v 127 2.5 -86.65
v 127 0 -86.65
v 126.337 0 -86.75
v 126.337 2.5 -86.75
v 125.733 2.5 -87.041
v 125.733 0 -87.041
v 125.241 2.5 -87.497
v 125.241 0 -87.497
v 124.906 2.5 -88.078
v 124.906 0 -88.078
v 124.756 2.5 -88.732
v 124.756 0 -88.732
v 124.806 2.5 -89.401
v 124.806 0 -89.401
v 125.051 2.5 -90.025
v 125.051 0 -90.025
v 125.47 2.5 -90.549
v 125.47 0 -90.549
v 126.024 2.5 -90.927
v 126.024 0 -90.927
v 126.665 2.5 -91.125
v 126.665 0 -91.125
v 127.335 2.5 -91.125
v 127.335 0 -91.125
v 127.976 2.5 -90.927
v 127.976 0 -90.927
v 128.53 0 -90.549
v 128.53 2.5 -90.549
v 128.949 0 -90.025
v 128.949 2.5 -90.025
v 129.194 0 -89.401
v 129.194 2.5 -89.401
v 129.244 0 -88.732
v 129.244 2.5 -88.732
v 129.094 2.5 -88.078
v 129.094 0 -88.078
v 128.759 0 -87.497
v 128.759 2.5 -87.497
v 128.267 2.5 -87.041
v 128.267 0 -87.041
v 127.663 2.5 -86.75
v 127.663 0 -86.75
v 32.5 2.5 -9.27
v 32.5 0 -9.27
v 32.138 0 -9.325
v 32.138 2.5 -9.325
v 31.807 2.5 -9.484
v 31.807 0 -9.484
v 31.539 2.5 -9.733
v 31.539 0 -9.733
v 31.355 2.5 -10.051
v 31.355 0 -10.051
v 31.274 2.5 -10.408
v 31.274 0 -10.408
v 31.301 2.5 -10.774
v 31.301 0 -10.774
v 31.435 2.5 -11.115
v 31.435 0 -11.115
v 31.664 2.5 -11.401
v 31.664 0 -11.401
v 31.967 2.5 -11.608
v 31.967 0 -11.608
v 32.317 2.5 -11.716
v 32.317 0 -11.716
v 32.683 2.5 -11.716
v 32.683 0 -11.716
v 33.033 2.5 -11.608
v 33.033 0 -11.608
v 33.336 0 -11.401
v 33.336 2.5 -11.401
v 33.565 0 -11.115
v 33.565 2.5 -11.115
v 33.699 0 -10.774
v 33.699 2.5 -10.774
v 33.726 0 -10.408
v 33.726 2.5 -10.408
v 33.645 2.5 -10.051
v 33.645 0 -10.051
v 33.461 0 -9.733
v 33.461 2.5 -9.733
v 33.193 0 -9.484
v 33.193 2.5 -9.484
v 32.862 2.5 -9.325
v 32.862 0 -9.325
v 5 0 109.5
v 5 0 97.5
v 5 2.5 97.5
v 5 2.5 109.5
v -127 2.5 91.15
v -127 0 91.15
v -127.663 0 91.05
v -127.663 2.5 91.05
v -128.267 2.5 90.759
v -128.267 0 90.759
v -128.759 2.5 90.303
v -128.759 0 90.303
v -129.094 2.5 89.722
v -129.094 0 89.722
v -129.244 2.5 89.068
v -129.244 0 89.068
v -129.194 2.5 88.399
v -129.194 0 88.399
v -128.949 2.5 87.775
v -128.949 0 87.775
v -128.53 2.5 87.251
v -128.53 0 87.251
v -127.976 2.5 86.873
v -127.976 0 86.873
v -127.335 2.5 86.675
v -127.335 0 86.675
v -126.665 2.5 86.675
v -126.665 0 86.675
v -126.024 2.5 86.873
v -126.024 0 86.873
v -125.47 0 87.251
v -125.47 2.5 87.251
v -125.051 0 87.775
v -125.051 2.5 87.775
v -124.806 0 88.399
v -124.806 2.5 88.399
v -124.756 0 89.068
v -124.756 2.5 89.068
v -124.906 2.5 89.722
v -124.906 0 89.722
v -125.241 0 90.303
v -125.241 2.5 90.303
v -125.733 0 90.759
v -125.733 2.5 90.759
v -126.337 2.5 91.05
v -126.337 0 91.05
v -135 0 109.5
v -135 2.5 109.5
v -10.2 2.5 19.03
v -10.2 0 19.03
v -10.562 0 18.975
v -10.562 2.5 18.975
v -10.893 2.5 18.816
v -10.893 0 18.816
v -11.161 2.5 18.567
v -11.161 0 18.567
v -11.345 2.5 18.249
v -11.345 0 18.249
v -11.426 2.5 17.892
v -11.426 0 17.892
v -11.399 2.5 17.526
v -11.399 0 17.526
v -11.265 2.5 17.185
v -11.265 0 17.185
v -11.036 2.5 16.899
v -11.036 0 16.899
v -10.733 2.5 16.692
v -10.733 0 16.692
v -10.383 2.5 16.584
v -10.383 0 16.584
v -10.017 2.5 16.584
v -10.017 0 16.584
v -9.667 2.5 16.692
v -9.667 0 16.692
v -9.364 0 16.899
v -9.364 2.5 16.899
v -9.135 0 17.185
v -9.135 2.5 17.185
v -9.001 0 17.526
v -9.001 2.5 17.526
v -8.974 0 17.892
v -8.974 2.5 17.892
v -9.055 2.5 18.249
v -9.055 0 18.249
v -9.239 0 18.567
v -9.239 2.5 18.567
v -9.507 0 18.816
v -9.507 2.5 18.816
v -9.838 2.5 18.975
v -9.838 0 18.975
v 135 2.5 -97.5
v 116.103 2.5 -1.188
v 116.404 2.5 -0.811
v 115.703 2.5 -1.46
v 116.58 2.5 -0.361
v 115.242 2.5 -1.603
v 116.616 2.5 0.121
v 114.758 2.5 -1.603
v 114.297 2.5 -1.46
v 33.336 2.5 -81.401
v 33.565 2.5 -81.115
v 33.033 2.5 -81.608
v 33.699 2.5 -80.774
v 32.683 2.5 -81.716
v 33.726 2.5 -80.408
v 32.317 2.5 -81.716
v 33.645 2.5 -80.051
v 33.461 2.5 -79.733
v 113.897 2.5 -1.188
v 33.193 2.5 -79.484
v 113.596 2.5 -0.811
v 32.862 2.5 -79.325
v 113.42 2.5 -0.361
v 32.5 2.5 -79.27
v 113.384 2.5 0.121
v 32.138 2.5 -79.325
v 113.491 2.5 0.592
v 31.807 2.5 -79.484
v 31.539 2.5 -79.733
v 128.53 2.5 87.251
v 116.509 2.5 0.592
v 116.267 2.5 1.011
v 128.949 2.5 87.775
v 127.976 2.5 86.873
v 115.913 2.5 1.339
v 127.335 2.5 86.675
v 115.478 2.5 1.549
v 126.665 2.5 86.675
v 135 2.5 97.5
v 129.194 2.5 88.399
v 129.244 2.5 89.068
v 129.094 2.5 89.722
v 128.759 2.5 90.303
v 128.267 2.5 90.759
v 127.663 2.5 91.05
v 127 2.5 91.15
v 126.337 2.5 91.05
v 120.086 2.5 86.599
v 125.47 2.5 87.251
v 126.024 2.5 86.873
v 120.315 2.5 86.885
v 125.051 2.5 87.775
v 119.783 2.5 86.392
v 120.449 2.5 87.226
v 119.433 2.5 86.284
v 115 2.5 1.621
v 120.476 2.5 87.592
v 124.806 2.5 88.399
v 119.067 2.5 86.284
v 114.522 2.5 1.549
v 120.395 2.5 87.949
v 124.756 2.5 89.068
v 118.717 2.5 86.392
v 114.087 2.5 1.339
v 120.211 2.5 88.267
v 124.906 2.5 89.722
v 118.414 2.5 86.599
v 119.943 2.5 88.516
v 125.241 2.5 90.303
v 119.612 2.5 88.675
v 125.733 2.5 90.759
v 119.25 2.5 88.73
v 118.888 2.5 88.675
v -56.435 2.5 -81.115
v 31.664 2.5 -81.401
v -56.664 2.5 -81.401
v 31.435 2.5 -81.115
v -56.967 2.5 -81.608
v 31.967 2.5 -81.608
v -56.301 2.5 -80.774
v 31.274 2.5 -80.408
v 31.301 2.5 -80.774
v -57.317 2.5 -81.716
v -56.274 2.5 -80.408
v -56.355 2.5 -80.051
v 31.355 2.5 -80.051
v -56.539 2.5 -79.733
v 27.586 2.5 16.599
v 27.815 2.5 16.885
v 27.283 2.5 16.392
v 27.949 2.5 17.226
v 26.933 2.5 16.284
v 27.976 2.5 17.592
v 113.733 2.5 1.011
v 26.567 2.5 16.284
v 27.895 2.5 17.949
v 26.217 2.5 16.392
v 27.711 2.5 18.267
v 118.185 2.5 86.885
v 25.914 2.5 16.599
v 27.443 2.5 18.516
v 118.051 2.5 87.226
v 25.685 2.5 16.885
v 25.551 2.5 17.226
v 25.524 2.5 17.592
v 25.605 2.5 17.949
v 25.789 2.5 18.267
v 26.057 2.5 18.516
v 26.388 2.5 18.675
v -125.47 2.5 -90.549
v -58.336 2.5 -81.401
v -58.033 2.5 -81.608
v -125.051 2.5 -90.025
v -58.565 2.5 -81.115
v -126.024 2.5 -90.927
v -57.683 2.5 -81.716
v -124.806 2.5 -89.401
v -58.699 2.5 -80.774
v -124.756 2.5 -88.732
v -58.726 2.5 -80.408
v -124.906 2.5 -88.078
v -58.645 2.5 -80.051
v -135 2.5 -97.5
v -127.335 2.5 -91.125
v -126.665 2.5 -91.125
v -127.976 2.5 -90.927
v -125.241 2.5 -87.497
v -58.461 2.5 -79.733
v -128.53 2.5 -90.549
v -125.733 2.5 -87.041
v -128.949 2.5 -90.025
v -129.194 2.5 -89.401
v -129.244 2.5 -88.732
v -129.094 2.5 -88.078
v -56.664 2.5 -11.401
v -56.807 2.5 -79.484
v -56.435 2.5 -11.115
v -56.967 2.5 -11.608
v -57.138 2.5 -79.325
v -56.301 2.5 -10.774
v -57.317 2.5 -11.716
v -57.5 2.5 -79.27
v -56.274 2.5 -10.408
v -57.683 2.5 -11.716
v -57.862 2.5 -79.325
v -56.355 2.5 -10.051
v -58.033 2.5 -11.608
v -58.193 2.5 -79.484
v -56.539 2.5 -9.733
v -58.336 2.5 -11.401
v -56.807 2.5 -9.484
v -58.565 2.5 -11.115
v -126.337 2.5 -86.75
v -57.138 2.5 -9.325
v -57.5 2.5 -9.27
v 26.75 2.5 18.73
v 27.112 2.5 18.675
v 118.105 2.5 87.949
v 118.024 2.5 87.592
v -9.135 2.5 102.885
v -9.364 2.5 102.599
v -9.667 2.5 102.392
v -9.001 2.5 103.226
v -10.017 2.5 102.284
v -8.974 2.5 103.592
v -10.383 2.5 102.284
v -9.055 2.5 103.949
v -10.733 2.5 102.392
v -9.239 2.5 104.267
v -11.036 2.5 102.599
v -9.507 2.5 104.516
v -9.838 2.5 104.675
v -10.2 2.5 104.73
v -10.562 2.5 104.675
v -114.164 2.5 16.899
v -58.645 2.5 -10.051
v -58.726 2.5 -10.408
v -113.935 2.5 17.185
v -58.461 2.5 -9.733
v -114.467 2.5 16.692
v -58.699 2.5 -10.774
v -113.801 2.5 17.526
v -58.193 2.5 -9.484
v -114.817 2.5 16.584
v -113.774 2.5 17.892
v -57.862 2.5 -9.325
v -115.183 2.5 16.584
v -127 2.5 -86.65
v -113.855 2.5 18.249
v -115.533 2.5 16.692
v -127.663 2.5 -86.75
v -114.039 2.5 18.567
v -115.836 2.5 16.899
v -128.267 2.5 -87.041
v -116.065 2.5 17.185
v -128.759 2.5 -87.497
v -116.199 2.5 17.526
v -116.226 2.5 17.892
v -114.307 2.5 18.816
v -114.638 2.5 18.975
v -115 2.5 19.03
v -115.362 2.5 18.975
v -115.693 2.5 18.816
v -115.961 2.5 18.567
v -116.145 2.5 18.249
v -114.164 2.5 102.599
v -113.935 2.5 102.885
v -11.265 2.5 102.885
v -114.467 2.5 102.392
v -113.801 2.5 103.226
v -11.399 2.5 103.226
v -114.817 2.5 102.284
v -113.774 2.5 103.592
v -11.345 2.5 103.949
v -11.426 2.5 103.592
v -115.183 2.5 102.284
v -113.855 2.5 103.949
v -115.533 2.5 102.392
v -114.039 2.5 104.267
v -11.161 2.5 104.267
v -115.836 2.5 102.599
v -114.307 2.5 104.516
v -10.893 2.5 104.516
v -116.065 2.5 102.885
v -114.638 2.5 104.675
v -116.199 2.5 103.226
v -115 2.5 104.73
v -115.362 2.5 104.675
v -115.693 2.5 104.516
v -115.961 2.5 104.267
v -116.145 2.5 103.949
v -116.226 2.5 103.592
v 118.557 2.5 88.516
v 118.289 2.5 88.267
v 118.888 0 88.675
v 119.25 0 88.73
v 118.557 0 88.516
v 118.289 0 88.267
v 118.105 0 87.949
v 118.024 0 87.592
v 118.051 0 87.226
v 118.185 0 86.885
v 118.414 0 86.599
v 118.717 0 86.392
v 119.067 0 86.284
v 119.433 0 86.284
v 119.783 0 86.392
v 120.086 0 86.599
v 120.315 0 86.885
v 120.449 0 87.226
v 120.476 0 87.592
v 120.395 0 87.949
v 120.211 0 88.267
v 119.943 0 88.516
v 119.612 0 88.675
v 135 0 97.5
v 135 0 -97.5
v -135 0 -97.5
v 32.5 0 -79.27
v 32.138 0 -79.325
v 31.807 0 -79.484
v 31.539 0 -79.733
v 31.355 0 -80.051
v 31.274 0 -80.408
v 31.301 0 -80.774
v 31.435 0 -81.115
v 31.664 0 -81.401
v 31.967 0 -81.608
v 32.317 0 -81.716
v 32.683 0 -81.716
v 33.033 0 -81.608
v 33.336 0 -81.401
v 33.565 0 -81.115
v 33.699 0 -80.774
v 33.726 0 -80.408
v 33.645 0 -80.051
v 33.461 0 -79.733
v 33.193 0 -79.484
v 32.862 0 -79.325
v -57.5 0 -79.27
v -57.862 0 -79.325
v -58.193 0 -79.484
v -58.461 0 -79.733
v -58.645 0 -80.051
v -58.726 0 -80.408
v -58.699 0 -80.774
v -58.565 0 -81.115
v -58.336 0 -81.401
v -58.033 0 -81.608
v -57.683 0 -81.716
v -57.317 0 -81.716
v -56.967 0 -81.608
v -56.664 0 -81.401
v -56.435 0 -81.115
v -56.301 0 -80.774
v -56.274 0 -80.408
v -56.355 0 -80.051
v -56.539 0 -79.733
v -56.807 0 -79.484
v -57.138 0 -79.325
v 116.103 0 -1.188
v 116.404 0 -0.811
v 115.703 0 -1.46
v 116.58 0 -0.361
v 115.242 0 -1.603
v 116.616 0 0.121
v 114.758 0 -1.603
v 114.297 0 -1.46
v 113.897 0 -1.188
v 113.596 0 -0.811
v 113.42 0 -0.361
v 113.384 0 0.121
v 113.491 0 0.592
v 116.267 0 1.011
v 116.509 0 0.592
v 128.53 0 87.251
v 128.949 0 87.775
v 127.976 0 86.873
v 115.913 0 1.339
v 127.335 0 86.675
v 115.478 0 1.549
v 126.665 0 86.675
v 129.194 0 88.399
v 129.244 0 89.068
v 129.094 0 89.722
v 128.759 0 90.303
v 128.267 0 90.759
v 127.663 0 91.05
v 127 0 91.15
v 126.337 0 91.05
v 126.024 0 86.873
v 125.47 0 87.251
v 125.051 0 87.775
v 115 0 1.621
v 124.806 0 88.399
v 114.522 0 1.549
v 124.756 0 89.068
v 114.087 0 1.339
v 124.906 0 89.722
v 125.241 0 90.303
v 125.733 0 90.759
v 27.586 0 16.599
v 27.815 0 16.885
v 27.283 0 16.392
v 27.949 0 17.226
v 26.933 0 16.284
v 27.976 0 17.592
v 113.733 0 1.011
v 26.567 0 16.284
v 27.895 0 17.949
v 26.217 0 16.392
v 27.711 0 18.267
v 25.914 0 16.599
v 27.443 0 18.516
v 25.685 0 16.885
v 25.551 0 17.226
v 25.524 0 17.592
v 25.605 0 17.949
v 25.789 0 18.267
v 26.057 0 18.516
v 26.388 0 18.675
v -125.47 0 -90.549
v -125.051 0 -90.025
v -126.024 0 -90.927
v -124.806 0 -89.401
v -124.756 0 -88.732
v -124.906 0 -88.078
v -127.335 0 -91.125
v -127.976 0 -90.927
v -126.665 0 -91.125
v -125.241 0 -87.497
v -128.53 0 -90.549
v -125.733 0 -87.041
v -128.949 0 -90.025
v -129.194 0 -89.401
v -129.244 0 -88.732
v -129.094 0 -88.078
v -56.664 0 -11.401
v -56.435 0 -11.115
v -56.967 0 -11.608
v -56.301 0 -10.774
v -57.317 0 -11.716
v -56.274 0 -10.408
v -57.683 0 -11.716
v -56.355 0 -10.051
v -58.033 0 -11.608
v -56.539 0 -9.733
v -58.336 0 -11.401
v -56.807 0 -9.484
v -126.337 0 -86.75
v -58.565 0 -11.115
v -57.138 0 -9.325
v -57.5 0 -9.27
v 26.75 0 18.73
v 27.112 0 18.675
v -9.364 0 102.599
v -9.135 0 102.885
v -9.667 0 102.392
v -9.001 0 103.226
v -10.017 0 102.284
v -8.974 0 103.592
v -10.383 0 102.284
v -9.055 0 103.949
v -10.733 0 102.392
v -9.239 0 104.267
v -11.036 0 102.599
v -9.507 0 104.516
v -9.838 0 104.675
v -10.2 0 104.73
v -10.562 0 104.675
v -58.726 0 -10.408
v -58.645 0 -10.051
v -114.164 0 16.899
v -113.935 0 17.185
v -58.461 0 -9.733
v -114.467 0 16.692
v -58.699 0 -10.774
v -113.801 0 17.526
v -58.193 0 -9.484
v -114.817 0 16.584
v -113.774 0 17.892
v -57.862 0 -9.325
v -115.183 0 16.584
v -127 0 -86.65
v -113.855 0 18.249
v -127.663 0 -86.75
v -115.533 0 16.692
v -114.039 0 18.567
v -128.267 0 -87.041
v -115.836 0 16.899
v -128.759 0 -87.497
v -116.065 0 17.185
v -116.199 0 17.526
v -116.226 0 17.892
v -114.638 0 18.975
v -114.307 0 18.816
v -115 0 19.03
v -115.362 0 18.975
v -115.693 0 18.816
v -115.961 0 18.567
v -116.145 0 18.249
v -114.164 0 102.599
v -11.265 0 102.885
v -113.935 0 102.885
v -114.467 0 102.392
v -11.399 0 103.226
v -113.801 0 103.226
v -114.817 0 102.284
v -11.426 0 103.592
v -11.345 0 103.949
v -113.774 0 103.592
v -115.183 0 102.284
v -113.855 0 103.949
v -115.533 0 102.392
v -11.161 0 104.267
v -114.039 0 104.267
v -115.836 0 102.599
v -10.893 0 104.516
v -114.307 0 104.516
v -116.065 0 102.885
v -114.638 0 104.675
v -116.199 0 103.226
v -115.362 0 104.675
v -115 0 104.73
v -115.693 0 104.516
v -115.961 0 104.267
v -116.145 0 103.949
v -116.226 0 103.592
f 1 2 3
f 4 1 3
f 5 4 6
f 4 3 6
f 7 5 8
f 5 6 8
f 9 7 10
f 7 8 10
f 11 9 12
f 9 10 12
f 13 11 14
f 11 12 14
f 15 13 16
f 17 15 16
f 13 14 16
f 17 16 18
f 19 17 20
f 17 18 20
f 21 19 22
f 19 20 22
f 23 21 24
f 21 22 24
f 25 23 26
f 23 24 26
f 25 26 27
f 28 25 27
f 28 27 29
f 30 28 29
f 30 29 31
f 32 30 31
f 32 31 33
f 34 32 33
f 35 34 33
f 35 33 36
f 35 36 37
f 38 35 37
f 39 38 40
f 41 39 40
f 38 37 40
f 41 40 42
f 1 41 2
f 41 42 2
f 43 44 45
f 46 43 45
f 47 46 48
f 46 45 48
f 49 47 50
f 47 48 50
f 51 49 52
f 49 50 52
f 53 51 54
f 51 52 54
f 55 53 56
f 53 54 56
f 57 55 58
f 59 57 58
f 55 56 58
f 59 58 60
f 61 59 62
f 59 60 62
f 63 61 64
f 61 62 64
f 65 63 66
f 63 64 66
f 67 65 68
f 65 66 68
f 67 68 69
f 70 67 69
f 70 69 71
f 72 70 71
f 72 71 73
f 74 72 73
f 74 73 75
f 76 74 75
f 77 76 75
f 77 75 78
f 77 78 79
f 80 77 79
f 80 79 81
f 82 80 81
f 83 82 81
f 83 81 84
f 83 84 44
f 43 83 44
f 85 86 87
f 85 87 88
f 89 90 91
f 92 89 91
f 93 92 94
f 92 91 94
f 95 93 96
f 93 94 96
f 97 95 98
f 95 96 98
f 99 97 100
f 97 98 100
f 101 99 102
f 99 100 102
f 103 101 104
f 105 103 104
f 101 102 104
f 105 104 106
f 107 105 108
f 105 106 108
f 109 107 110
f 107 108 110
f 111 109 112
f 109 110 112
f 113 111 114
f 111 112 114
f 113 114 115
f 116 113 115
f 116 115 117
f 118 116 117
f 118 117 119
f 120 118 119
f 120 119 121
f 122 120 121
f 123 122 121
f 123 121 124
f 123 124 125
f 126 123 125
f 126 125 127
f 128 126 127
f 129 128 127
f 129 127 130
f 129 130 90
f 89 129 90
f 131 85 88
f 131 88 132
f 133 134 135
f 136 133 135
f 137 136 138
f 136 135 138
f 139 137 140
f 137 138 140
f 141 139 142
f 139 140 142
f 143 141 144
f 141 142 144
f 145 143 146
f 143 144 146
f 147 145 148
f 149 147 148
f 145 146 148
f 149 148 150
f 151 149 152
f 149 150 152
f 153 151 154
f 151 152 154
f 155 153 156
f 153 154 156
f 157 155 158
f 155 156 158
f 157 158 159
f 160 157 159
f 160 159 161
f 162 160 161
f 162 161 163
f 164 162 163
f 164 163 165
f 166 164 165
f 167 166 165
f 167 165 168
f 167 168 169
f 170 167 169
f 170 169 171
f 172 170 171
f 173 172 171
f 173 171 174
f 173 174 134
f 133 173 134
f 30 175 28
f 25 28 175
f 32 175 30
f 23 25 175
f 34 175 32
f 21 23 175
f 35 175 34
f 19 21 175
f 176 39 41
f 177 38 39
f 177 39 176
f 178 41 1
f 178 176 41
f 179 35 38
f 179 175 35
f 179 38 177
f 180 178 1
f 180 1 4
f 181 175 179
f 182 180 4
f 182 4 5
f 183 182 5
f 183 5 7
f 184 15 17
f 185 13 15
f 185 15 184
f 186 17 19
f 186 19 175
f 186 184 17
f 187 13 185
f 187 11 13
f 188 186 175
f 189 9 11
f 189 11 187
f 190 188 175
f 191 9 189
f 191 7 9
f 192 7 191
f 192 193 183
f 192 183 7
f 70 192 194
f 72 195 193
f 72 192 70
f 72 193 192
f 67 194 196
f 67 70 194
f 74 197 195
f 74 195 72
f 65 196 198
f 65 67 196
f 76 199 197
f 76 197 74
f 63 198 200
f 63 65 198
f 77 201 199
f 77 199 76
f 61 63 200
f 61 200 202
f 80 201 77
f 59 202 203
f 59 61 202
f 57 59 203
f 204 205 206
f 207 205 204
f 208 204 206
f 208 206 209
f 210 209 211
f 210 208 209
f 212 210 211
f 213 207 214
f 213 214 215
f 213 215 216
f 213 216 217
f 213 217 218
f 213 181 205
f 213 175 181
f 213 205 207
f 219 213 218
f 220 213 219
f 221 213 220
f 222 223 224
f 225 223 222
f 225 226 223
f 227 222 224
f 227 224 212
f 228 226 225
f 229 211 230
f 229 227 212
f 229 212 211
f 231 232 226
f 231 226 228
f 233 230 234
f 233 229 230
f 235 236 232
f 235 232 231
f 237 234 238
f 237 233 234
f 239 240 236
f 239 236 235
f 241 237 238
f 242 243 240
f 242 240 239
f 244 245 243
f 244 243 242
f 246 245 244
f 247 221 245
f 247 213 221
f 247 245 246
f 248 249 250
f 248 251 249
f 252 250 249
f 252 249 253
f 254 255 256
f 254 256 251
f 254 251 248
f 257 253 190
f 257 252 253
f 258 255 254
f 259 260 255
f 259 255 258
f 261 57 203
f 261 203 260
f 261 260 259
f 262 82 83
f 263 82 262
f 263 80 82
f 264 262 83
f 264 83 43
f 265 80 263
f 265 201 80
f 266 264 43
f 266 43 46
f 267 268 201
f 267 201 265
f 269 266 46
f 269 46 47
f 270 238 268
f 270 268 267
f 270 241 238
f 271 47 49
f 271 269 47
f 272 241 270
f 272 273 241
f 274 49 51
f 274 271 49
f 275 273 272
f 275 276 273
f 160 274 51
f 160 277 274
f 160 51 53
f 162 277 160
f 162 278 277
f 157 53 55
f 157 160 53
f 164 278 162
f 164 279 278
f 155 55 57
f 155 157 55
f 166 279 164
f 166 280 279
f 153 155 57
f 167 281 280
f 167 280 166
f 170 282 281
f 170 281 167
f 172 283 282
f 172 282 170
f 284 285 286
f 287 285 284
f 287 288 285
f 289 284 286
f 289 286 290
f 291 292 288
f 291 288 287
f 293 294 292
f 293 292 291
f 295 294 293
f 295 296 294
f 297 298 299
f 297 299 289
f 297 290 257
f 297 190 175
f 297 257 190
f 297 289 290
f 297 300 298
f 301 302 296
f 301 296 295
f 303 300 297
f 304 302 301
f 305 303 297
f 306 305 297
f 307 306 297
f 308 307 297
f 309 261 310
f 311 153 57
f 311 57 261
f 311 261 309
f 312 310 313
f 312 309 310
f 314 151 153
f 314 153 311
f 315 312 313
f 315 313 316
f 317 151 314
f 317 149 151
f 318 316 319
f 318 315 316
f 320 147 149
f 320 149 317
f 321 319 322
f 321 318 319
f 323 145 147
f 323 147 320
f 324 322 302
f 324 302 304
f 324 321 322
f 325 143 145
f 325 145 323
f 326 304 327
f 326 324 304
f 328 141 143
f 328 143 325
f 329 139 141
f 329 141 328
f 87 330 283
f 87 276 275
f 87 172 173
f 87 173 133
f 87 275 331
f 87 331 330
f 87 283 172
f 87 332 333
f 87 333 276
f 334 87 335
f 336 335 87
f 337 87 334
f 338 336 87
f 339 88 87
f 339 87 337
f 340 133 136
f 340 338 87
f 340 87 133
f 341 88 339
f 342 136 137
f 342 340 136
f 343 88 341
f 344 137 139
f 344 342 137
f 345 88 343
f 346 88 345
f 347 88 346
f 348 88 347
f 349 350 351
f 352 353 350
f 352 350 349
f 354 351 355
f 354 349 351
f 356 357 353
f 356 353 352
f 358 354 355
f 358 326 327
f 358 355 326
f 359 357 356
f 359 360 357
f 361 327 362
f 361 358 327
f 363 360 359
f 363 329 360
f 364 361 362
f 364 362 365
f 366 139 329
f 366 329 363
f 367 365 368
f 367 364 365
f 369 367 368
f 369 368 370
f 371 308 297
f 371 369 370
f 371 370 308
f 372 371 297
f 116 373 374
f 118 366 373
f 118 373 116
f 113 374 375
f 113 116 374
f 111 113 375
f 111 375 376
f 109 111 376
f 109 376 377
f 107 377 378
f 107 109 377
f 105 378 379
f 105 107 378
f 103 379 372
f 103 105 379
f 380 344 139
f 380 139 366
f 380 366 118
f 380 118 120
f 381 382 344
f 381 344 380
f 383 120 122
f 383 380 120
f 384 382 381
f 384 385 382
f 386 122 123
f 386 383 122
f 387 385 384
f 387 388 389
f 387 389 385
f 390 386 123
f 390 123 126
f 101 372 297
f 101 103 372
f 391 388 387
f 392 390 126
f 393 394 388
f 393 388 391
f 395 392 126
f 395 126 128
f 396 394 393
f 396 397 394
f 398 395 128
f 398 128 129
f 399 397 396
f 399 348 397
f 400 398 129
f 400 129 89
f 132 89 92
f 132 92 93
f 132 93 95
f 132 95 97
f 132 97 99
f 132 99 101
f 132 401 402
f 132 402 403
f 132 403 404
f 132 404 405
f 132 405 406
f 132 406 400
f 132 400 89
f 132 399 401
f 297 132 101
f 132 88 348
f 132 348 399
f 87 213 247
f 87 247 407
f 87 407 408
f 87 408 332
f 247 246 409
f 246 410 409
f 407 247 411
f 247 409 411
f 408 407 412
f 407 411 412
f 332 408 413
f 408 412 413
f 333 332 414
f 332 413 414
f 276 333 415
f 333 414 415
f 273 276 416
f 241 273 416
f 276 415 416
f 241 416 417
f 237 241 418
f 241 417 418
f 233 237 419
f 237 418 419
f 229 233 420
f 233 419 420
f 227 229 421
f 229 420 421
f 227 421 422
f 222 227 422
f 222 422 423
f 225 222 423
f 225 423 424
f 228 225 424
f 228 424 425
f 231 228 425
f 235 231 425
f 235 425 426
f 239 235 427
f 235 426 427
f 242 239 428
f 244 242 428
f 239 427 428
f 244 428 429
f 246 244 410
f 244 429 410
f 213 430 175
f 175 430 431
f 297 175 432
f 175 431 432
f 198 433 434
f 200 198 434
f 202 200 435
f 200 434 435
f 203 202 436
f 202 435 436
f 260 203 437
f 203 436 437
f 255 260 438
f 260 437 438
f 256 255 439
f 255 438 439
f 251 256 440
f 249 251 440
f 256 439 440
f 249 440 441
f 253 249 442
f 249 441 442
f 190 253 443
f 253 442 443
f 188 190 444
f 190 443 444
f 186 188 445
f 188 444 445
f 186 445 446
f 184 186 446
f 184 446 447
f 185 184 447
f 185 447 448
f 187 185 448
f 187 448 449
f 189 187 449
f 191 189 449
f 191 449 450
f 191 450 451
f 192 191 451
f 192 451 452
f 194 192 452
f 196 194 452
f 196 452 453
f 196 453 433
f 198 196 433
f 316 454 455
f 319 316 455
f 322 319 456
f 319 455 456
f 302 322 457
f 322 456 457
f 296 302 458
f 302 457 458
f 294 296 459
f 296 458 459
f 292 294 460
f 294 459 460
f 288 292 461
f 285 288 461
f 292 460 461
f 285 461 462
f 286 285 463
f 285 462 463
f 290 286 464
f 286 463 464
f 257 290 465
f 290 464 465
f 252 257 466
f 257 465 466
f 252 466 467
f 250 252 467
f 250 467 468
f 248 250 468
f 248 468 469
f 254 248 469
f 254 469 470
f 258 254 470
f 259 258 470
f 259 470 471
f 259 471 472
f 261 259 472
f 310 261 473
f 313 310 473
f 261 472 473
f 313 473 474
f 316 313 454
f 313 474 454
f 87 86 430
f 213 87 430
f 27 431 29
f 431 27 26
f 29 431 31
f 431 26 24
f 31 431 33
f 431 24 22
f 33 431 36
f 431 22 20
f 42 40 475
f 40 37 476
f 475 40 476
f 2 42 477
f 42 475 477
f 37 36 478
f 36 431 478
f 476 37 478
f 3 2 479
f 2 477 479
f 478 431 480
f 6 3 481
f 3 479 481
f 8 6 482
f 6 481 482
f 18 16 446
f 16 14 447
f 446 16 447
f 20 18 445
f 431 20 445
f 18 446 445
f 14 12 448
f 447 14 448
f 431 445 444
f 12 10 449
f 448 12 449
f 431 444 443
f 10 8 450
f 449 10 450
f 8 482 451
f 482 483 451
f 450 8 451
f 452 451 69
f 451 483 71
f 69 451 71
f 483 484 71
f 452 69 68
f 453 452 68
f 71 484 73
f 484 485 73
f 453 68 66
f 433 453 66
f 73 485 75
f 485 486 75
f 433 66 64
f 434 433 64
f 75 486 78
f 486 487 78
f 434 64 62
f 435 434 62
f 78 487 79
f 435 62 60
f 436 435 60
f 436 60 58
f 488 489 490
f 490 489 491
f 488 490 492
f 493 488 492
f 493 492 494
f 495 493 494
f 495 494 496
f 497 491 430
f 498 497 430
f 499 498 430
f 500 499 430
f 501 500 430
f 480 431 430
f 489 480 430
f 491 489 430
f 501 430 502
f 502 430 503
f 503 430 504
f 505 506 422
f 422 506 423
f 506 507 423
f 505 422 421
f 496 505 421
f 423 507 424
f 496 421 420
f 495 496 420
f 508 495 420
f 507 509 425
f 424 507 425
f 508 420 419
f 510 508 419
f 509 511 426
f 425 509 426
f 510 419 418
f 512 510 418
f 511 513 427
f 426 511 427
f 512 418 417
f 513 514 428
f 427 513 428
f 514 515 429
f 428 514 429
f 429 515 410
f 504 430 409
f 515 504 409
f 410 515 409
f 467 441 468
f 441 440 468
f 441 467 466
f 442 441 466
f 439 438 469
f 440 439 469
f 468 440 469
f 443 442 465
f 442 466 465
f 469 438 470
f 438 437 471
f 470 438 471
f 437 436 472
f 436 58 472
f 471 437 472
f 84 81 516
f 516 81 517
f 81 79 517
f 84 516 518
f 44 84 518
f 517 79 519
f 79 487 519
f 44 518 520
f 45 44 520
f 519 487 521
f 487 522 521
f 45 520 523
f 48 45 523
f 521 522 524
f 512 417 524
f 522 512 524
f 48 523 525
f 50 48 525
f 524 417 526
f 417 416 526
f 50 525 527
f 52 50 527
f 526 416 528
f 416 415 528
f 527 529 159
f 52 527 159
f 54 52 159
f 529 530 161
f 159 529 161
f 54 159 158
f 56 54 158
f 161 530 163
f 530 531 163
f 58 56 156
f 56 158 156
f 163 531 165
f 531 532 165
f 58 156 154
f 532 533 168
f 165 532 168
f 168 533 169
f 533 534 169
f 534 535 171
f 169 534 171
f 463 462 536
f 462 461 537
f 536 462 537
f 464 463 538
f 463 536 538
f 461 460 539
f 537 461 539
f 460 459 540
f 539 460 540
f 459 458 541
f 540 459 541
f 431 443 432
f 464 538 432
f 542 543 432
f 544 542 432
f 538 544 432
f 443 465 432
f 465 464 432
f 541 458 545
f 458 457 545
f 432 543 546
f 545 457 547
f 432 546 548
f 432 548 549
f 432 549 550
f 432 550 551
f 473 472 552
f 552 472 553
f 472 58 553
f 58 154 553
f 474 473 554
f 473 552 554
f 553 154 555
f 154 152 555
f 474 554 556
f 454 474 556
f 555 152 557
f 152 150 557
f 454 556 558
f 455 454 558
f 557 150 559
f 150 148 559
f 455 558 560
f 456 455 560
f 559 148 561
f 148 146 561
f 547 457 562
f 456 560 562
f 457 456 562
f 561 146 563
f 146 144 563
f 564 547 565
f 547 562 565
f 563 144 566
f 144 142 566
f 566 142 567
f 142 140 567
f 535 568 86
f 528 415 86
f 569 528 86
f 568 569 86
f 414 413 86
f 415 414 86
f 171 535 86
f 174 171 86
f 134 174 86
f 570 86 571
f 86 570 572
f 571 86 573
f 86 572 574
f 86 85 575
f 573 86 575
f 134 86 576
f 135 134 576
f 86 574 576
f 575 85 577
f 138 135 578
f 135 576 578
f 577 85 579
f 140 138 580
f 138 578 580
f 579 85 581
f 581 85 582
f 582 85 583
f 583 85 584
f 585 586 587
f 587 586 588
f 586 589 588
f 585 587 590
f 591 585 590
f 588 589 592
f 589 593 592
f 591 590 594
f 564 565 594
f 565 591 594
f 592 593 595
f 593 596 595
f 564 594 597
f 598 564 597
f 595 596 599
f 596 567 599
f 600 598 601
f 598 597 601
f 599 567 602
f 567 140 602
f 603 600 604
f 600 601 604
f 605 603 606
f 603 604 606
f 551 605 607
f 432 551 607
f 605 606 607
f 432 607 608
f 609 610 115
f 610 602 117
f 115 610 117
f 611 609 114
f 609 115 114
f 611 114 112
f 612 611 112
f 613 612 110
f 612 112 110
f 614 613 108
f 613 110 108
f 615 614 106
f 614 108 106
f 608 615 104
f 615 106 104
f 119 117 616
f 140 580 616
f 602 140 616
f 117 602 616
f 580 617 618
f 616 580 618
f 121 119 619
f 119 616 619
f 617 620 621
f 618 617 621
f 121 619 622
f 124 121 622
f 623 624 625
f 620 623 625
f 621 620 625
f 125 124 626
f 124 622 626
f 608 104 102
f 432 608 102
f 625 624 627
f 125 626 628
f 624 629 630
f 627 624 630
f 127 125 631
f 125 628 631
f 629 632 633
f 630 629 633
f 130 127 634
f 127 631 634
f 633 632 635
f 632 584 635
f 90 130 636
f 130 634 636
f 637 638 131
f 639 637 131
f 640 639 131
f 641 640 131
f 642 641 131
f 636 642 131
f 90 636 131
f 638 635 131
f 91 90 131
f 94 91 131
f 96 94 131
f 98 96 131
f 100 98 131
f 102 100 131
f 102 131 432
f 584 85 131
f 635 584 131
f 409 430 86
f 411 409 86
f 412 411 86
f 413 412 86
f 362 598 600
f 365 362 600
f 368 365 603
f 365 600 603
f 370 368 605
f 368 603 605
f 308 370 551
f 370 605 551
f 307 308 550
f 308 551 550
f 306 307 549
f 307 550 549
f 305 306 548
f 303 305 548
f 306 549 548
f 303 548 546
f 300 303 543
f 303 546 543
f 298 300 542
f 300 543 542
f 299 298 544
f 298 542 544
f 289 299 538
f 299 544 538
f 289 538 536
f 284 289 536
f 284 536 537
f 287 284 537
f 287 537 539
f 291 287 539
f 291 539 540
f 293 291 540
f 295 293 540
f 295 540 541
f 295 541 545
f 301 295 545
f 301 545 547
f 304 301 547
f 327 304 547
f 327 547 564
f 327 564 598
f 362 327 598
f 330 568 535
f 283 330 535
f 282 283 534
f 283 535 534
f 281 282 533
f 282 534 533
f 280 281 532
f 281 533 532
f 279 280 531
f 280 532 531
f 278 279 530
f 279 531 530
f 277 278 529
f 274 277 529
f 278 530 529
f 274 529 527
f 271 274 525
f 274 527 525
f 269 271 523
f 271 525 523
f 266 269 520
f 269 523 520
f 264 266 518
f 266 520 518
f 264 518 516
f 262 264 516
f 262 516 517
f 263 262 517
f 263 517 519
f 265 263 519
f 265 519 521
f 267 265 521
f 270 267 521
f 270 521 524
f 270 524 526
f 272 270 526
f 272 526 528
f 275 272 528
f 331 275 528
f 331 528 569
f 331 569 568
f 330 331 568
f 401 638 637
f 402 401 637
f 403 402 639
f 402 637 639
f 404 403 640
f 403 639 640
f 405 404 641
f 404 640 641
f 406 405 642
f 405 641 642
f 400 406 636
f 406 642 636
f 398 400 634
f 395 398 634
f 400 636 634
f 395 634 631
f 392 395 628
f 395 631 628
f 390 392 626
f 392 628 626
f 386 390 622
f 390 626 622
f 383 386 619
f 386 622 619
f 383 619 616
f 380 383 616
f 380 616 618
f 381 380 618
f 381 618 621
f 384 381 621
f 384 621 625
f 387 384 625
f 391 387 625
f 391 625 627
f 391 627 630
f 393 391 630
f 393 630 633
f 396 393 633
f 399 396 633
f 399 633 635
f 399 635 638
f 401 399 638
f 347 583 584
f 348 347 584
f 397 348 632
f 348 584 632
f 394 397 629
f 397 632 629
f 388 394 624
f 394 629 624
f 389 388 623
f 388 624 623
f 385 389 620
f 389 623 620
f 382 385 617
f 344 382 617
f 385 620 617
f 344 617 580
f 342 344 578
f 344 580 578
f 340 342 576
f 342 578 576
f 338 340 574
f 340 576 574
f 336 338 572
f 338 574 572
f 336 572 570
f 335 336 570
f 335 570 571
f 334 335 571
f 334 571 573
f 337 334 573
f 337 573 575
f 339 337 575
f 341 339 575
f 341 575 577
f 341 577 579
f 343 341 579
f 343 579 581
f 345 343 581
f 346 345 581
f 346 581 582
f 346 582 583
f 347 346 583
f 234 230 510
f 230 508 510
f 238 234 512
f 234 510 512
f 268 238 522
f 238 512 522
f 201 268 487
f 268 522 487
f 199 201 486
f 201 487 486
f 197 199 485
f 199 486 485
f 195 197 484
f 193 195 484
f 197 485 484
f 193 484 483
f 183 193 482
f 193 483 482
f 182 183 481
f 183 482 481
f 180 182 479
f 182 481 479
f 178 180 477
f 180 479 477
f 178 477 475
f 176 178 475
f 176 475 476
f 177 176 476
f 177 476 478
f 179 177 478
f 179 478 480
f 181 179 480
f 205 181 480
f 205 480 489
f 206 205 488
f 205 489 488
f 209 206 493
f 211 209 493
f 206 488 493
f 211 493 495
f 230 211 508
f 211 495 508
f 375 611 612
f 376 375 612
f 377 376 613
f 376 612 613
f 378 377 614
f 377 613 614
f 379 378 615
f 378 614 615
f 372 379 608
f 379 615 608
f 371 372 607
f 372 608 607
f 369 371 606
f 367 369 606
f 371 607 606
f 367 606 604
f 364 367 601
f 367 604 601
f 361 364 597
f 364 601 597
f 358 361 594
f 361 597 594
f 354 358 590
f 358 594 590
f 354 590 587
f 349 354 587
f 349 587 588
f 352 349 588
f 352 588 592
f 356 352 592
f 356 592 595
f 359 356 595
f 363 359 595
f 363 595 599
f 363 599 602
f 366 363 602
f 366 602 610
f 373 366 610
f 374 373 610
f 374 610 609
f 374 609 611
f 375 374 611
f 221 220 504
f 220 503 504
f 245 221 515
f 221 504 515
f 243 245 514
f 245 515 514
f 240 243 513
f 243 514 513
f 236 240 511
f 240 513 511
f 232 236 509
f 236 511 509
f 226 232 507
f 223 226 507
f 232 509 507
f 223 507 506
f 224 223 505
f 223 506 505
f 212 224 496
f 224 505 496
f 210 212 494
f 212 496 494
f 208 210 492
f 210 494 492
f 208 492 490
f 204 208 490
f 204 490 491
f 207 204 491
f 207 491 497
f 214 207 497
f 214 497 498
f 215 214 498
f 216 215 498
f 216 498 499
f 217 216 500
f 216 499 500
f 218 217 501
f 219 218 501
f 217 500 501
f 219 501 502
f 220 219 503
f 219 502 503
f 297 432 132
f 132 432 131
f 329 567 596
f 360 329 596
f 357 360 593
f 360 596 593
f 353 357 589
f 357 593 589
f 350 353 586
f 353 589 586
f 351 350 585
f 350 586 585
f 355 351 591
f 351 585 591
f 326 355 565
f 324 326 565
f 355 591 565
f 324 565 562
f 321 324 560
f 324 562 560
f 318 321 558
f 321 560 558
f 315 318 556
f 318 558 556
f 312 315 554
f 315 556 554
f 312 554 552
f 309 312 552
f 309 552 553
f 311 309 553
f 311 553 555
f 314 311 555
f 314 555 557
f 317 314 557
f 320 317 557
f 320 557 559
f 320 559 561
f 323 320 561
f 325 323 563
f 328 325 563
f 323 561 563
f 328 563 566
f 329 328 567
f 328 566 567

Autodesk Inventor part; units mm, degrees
ref_plane "YZ Plane" through (0, 0, 0) normal (1, 0, 0) x (0, 1, 0)
ref_plane "XZ Plane" through (0, 0, 0) normal (0, 1, 0) x (-1, 0, 0)
ref_plane "XY Plane" through (0, 0, 0) normal (0, 0, 1) x (1, 0, 0)
sketch "Sketch1" plane through (0, 0, 0) normal (0, 1, 0) x (-1, 0, 0)
  line L0 (135, 97.5) -> (-135, 97.5)
  line L1 (-135, 97.5) -> (-135, -97.5)
  line L2 (-135, -97.5) -> (135, -97.5)
  line L3 (135, -97.5) -> (135, 97.5)
  line L4 (135, 97.5) -> (-135, -97.5) construction
  line L5 (-135, 97.5) -> (135, -97.5) construction
  line L6 (135, 97.5) -> (-5, 97.5)
  line L7 (-5, 97.5) -> (-5, 109.5)
  line L8 (-5, 109.5) -> (135, 109.5)
  line L9 (135, 109.5) -> (135, 97.5)
  point P0 (0, 0)
  dimension "d0" = 270
  dimension "d1" = 195
  dimension "d2" = 140
  dimension "d3" = 12
  dimension "d4" = 0
  dimension "d5" = 0
extrude "Extrusion1" add sketch "Sketch1" along normal blind 2.5
sketch "Sketch2" plane through (0, 2.5, 0) normal (0, 1, 0) x (1, 0, 0)
  line L0 (26.75, -17.5) -> (119.25, -17.5) construction
  line L1 (119.25, -17.5) -> (119.25, -87.5) construction
  line L2 (119.25, -87.5) -> (26.75, -87.5) construction
  line L3 (26.75, -87.5) -> (26.75, -17.5) construction
  line L4 (26.75, -17.5) -> (119.25, -87.5) construction
  line L5 (119.25, -17.5) -> (26.75, -87.5) construction
  line L6 (5, -97.5) -> (135, -97.5) construction
  line L7 (135, -97.5) -> (135, 97.5) projected
  point P0 (0, 0)
  point P1 (73, -52.5)
  dimension "d8" = 92.5
  dimension "d9" = 70
  dimension "d10" = 45
  dimension "d11" = 62
hole "LRS-35-5" at (26.75, 2.5, 17.5) at (119.25, 2.5, 87.5) direction (0, -1, 0) diameter 2.459 end through all thread size "M3x0.5" class "6H" standard "ISO Metric profile"
sketch "HB12-1.7AG" plane through (0, 2.5, 0) normal (0, 1, 0) x (1, 0, 0)
  line L0 (-115, -103.5) -> (-10.2, -103.5) construction
  line L1 (-10.2, -103.5) -> (-10.2, -17.8) construction
  line L2 (-10.2, -17.8) -> (-115, -17.8) construction
  line L3 (-115, -17.8) -> (-115, -103.5) construction
  line L4 (-115, -103.5) -> (-10.2, -17.8) construction
  line L5 (-10.2, -103.5) -> (-115, -17.8) construction
  line L6 (-135, 97.5) -> (-135, -109.5) construction
  line L7 (-135, -109.5) -> (5, -109.5) construction
  point P0 (0, 0)
  point P1 (-62.6, -60.65)
  dimension "d19" = 104.8
  dimension "d20" = 85.7
  dimension "d23" = 6
  dimension "d24" = 20
hole "BEl PSU" at (-115, 2.5, 17.8) at (-10.2, 2.5, 17.8) at (-10.2, 2.5, 103.5) at (-115, 2.5, 103.5) at (-115, 2.5, 17.8) at (-10.2, 2.5, 17.8) at (-10.2, 2.5, 103.5) at (-115, 2.5, 103.5) direction (0, -1, 0) diameter 2.459 end through all thread size "M3x0.5" class "6H" standard "ISO Metric profile"
sketch "Mounting Holes" plane through (0, 2.5, 0) normal (0, 1, 0) x (1, 0, 0)
  line L0 (-127, -88.9) -> (127, -88.9) construction
  line L1 (127, -88.9) -> (127, 88.9) construction
  line L2 (127, 88.9) -> (-127, 88.9) construction
  line L3 (-127, 88.9) -> (-127, -88.9) construction
  line L4 (-127, -88.9) -> (127, 88.9) construction
  line L5 (127, -88.9) -> (-127, 88.9) construction
  point P0 (0, 0)
  dimension "d32" = 254
  dimension "d33" = 177.8
hole "Hole3" at (-127, 2.5, -88.9) at (127, 2.5, -88.9) at (127, 2.5, 88.9) at (-127, 2.5, 88.9) direction (0, -1, 0) diameter 4.5 end through all
sketch "WR-LEN" plane through (0, 2.5, 0) normal (0, 1, 0) x (1, 0, 0)
  line L0 (32.5, 80.5) -> (-57.5, 80.5) construction
  line L1 (-57.5, 80.5) -> (-57.5, 10.5) construction
  line L2 (-57.5, 10.5) -> (32.5, 10.5) construction
  line L3 (32.5, 10.5) -> (32.5, 80.5) construction
  line L4 (32.5, 80.5) -> (-57.5, 10.5) construction
  line L5 (-57.5, 80.5) -> (32.5, 10.5) construction
  line L6 (-135, 97.5) -> (-135, -109.5) projected
  line L7 (135, 97.5) -> (-135, 97.5) projected
  point P0 (0, 0)
  point P1 (-12.5, 45.5)
  dimension "d41" = 90
  dimension "d42" = 70
  dimension "d44" = 52
  dimension "d52" = 77.5
hole "WR-LEN-Hole" at (-57.5, 2.5, -80.5) at (32.5, 2.5, -80.5) at (32.5, 2.5, -10.5) at (-57.5, 2.5, -10.5) direction (0, -1, 0) diameter 2.459 end through all thread size "M3x0.5" class "6H" standard "ISO Metric profile"
sketch "GND" plane through (0, 2.5, 0) normal (0, 1, 0) x (1, 0, 0)
  line L0 (135, -97.5) -> (135, 97.5) projected
  line L1 (135, 97.5) -> (-135, 97.5) projected
  point P0 (0, 0)
  point P1 (115, 0)
  dimension "d53" = 20
  dimension "d54" = 97.5
hole "GND-Hole" at (115, 2.5, 0) direction (0, -1, 0) diameter 3.242 end through all thread size "M4x0.7" class "6H" standard "ISO Metric profile"
properties part number "Plate-0"
